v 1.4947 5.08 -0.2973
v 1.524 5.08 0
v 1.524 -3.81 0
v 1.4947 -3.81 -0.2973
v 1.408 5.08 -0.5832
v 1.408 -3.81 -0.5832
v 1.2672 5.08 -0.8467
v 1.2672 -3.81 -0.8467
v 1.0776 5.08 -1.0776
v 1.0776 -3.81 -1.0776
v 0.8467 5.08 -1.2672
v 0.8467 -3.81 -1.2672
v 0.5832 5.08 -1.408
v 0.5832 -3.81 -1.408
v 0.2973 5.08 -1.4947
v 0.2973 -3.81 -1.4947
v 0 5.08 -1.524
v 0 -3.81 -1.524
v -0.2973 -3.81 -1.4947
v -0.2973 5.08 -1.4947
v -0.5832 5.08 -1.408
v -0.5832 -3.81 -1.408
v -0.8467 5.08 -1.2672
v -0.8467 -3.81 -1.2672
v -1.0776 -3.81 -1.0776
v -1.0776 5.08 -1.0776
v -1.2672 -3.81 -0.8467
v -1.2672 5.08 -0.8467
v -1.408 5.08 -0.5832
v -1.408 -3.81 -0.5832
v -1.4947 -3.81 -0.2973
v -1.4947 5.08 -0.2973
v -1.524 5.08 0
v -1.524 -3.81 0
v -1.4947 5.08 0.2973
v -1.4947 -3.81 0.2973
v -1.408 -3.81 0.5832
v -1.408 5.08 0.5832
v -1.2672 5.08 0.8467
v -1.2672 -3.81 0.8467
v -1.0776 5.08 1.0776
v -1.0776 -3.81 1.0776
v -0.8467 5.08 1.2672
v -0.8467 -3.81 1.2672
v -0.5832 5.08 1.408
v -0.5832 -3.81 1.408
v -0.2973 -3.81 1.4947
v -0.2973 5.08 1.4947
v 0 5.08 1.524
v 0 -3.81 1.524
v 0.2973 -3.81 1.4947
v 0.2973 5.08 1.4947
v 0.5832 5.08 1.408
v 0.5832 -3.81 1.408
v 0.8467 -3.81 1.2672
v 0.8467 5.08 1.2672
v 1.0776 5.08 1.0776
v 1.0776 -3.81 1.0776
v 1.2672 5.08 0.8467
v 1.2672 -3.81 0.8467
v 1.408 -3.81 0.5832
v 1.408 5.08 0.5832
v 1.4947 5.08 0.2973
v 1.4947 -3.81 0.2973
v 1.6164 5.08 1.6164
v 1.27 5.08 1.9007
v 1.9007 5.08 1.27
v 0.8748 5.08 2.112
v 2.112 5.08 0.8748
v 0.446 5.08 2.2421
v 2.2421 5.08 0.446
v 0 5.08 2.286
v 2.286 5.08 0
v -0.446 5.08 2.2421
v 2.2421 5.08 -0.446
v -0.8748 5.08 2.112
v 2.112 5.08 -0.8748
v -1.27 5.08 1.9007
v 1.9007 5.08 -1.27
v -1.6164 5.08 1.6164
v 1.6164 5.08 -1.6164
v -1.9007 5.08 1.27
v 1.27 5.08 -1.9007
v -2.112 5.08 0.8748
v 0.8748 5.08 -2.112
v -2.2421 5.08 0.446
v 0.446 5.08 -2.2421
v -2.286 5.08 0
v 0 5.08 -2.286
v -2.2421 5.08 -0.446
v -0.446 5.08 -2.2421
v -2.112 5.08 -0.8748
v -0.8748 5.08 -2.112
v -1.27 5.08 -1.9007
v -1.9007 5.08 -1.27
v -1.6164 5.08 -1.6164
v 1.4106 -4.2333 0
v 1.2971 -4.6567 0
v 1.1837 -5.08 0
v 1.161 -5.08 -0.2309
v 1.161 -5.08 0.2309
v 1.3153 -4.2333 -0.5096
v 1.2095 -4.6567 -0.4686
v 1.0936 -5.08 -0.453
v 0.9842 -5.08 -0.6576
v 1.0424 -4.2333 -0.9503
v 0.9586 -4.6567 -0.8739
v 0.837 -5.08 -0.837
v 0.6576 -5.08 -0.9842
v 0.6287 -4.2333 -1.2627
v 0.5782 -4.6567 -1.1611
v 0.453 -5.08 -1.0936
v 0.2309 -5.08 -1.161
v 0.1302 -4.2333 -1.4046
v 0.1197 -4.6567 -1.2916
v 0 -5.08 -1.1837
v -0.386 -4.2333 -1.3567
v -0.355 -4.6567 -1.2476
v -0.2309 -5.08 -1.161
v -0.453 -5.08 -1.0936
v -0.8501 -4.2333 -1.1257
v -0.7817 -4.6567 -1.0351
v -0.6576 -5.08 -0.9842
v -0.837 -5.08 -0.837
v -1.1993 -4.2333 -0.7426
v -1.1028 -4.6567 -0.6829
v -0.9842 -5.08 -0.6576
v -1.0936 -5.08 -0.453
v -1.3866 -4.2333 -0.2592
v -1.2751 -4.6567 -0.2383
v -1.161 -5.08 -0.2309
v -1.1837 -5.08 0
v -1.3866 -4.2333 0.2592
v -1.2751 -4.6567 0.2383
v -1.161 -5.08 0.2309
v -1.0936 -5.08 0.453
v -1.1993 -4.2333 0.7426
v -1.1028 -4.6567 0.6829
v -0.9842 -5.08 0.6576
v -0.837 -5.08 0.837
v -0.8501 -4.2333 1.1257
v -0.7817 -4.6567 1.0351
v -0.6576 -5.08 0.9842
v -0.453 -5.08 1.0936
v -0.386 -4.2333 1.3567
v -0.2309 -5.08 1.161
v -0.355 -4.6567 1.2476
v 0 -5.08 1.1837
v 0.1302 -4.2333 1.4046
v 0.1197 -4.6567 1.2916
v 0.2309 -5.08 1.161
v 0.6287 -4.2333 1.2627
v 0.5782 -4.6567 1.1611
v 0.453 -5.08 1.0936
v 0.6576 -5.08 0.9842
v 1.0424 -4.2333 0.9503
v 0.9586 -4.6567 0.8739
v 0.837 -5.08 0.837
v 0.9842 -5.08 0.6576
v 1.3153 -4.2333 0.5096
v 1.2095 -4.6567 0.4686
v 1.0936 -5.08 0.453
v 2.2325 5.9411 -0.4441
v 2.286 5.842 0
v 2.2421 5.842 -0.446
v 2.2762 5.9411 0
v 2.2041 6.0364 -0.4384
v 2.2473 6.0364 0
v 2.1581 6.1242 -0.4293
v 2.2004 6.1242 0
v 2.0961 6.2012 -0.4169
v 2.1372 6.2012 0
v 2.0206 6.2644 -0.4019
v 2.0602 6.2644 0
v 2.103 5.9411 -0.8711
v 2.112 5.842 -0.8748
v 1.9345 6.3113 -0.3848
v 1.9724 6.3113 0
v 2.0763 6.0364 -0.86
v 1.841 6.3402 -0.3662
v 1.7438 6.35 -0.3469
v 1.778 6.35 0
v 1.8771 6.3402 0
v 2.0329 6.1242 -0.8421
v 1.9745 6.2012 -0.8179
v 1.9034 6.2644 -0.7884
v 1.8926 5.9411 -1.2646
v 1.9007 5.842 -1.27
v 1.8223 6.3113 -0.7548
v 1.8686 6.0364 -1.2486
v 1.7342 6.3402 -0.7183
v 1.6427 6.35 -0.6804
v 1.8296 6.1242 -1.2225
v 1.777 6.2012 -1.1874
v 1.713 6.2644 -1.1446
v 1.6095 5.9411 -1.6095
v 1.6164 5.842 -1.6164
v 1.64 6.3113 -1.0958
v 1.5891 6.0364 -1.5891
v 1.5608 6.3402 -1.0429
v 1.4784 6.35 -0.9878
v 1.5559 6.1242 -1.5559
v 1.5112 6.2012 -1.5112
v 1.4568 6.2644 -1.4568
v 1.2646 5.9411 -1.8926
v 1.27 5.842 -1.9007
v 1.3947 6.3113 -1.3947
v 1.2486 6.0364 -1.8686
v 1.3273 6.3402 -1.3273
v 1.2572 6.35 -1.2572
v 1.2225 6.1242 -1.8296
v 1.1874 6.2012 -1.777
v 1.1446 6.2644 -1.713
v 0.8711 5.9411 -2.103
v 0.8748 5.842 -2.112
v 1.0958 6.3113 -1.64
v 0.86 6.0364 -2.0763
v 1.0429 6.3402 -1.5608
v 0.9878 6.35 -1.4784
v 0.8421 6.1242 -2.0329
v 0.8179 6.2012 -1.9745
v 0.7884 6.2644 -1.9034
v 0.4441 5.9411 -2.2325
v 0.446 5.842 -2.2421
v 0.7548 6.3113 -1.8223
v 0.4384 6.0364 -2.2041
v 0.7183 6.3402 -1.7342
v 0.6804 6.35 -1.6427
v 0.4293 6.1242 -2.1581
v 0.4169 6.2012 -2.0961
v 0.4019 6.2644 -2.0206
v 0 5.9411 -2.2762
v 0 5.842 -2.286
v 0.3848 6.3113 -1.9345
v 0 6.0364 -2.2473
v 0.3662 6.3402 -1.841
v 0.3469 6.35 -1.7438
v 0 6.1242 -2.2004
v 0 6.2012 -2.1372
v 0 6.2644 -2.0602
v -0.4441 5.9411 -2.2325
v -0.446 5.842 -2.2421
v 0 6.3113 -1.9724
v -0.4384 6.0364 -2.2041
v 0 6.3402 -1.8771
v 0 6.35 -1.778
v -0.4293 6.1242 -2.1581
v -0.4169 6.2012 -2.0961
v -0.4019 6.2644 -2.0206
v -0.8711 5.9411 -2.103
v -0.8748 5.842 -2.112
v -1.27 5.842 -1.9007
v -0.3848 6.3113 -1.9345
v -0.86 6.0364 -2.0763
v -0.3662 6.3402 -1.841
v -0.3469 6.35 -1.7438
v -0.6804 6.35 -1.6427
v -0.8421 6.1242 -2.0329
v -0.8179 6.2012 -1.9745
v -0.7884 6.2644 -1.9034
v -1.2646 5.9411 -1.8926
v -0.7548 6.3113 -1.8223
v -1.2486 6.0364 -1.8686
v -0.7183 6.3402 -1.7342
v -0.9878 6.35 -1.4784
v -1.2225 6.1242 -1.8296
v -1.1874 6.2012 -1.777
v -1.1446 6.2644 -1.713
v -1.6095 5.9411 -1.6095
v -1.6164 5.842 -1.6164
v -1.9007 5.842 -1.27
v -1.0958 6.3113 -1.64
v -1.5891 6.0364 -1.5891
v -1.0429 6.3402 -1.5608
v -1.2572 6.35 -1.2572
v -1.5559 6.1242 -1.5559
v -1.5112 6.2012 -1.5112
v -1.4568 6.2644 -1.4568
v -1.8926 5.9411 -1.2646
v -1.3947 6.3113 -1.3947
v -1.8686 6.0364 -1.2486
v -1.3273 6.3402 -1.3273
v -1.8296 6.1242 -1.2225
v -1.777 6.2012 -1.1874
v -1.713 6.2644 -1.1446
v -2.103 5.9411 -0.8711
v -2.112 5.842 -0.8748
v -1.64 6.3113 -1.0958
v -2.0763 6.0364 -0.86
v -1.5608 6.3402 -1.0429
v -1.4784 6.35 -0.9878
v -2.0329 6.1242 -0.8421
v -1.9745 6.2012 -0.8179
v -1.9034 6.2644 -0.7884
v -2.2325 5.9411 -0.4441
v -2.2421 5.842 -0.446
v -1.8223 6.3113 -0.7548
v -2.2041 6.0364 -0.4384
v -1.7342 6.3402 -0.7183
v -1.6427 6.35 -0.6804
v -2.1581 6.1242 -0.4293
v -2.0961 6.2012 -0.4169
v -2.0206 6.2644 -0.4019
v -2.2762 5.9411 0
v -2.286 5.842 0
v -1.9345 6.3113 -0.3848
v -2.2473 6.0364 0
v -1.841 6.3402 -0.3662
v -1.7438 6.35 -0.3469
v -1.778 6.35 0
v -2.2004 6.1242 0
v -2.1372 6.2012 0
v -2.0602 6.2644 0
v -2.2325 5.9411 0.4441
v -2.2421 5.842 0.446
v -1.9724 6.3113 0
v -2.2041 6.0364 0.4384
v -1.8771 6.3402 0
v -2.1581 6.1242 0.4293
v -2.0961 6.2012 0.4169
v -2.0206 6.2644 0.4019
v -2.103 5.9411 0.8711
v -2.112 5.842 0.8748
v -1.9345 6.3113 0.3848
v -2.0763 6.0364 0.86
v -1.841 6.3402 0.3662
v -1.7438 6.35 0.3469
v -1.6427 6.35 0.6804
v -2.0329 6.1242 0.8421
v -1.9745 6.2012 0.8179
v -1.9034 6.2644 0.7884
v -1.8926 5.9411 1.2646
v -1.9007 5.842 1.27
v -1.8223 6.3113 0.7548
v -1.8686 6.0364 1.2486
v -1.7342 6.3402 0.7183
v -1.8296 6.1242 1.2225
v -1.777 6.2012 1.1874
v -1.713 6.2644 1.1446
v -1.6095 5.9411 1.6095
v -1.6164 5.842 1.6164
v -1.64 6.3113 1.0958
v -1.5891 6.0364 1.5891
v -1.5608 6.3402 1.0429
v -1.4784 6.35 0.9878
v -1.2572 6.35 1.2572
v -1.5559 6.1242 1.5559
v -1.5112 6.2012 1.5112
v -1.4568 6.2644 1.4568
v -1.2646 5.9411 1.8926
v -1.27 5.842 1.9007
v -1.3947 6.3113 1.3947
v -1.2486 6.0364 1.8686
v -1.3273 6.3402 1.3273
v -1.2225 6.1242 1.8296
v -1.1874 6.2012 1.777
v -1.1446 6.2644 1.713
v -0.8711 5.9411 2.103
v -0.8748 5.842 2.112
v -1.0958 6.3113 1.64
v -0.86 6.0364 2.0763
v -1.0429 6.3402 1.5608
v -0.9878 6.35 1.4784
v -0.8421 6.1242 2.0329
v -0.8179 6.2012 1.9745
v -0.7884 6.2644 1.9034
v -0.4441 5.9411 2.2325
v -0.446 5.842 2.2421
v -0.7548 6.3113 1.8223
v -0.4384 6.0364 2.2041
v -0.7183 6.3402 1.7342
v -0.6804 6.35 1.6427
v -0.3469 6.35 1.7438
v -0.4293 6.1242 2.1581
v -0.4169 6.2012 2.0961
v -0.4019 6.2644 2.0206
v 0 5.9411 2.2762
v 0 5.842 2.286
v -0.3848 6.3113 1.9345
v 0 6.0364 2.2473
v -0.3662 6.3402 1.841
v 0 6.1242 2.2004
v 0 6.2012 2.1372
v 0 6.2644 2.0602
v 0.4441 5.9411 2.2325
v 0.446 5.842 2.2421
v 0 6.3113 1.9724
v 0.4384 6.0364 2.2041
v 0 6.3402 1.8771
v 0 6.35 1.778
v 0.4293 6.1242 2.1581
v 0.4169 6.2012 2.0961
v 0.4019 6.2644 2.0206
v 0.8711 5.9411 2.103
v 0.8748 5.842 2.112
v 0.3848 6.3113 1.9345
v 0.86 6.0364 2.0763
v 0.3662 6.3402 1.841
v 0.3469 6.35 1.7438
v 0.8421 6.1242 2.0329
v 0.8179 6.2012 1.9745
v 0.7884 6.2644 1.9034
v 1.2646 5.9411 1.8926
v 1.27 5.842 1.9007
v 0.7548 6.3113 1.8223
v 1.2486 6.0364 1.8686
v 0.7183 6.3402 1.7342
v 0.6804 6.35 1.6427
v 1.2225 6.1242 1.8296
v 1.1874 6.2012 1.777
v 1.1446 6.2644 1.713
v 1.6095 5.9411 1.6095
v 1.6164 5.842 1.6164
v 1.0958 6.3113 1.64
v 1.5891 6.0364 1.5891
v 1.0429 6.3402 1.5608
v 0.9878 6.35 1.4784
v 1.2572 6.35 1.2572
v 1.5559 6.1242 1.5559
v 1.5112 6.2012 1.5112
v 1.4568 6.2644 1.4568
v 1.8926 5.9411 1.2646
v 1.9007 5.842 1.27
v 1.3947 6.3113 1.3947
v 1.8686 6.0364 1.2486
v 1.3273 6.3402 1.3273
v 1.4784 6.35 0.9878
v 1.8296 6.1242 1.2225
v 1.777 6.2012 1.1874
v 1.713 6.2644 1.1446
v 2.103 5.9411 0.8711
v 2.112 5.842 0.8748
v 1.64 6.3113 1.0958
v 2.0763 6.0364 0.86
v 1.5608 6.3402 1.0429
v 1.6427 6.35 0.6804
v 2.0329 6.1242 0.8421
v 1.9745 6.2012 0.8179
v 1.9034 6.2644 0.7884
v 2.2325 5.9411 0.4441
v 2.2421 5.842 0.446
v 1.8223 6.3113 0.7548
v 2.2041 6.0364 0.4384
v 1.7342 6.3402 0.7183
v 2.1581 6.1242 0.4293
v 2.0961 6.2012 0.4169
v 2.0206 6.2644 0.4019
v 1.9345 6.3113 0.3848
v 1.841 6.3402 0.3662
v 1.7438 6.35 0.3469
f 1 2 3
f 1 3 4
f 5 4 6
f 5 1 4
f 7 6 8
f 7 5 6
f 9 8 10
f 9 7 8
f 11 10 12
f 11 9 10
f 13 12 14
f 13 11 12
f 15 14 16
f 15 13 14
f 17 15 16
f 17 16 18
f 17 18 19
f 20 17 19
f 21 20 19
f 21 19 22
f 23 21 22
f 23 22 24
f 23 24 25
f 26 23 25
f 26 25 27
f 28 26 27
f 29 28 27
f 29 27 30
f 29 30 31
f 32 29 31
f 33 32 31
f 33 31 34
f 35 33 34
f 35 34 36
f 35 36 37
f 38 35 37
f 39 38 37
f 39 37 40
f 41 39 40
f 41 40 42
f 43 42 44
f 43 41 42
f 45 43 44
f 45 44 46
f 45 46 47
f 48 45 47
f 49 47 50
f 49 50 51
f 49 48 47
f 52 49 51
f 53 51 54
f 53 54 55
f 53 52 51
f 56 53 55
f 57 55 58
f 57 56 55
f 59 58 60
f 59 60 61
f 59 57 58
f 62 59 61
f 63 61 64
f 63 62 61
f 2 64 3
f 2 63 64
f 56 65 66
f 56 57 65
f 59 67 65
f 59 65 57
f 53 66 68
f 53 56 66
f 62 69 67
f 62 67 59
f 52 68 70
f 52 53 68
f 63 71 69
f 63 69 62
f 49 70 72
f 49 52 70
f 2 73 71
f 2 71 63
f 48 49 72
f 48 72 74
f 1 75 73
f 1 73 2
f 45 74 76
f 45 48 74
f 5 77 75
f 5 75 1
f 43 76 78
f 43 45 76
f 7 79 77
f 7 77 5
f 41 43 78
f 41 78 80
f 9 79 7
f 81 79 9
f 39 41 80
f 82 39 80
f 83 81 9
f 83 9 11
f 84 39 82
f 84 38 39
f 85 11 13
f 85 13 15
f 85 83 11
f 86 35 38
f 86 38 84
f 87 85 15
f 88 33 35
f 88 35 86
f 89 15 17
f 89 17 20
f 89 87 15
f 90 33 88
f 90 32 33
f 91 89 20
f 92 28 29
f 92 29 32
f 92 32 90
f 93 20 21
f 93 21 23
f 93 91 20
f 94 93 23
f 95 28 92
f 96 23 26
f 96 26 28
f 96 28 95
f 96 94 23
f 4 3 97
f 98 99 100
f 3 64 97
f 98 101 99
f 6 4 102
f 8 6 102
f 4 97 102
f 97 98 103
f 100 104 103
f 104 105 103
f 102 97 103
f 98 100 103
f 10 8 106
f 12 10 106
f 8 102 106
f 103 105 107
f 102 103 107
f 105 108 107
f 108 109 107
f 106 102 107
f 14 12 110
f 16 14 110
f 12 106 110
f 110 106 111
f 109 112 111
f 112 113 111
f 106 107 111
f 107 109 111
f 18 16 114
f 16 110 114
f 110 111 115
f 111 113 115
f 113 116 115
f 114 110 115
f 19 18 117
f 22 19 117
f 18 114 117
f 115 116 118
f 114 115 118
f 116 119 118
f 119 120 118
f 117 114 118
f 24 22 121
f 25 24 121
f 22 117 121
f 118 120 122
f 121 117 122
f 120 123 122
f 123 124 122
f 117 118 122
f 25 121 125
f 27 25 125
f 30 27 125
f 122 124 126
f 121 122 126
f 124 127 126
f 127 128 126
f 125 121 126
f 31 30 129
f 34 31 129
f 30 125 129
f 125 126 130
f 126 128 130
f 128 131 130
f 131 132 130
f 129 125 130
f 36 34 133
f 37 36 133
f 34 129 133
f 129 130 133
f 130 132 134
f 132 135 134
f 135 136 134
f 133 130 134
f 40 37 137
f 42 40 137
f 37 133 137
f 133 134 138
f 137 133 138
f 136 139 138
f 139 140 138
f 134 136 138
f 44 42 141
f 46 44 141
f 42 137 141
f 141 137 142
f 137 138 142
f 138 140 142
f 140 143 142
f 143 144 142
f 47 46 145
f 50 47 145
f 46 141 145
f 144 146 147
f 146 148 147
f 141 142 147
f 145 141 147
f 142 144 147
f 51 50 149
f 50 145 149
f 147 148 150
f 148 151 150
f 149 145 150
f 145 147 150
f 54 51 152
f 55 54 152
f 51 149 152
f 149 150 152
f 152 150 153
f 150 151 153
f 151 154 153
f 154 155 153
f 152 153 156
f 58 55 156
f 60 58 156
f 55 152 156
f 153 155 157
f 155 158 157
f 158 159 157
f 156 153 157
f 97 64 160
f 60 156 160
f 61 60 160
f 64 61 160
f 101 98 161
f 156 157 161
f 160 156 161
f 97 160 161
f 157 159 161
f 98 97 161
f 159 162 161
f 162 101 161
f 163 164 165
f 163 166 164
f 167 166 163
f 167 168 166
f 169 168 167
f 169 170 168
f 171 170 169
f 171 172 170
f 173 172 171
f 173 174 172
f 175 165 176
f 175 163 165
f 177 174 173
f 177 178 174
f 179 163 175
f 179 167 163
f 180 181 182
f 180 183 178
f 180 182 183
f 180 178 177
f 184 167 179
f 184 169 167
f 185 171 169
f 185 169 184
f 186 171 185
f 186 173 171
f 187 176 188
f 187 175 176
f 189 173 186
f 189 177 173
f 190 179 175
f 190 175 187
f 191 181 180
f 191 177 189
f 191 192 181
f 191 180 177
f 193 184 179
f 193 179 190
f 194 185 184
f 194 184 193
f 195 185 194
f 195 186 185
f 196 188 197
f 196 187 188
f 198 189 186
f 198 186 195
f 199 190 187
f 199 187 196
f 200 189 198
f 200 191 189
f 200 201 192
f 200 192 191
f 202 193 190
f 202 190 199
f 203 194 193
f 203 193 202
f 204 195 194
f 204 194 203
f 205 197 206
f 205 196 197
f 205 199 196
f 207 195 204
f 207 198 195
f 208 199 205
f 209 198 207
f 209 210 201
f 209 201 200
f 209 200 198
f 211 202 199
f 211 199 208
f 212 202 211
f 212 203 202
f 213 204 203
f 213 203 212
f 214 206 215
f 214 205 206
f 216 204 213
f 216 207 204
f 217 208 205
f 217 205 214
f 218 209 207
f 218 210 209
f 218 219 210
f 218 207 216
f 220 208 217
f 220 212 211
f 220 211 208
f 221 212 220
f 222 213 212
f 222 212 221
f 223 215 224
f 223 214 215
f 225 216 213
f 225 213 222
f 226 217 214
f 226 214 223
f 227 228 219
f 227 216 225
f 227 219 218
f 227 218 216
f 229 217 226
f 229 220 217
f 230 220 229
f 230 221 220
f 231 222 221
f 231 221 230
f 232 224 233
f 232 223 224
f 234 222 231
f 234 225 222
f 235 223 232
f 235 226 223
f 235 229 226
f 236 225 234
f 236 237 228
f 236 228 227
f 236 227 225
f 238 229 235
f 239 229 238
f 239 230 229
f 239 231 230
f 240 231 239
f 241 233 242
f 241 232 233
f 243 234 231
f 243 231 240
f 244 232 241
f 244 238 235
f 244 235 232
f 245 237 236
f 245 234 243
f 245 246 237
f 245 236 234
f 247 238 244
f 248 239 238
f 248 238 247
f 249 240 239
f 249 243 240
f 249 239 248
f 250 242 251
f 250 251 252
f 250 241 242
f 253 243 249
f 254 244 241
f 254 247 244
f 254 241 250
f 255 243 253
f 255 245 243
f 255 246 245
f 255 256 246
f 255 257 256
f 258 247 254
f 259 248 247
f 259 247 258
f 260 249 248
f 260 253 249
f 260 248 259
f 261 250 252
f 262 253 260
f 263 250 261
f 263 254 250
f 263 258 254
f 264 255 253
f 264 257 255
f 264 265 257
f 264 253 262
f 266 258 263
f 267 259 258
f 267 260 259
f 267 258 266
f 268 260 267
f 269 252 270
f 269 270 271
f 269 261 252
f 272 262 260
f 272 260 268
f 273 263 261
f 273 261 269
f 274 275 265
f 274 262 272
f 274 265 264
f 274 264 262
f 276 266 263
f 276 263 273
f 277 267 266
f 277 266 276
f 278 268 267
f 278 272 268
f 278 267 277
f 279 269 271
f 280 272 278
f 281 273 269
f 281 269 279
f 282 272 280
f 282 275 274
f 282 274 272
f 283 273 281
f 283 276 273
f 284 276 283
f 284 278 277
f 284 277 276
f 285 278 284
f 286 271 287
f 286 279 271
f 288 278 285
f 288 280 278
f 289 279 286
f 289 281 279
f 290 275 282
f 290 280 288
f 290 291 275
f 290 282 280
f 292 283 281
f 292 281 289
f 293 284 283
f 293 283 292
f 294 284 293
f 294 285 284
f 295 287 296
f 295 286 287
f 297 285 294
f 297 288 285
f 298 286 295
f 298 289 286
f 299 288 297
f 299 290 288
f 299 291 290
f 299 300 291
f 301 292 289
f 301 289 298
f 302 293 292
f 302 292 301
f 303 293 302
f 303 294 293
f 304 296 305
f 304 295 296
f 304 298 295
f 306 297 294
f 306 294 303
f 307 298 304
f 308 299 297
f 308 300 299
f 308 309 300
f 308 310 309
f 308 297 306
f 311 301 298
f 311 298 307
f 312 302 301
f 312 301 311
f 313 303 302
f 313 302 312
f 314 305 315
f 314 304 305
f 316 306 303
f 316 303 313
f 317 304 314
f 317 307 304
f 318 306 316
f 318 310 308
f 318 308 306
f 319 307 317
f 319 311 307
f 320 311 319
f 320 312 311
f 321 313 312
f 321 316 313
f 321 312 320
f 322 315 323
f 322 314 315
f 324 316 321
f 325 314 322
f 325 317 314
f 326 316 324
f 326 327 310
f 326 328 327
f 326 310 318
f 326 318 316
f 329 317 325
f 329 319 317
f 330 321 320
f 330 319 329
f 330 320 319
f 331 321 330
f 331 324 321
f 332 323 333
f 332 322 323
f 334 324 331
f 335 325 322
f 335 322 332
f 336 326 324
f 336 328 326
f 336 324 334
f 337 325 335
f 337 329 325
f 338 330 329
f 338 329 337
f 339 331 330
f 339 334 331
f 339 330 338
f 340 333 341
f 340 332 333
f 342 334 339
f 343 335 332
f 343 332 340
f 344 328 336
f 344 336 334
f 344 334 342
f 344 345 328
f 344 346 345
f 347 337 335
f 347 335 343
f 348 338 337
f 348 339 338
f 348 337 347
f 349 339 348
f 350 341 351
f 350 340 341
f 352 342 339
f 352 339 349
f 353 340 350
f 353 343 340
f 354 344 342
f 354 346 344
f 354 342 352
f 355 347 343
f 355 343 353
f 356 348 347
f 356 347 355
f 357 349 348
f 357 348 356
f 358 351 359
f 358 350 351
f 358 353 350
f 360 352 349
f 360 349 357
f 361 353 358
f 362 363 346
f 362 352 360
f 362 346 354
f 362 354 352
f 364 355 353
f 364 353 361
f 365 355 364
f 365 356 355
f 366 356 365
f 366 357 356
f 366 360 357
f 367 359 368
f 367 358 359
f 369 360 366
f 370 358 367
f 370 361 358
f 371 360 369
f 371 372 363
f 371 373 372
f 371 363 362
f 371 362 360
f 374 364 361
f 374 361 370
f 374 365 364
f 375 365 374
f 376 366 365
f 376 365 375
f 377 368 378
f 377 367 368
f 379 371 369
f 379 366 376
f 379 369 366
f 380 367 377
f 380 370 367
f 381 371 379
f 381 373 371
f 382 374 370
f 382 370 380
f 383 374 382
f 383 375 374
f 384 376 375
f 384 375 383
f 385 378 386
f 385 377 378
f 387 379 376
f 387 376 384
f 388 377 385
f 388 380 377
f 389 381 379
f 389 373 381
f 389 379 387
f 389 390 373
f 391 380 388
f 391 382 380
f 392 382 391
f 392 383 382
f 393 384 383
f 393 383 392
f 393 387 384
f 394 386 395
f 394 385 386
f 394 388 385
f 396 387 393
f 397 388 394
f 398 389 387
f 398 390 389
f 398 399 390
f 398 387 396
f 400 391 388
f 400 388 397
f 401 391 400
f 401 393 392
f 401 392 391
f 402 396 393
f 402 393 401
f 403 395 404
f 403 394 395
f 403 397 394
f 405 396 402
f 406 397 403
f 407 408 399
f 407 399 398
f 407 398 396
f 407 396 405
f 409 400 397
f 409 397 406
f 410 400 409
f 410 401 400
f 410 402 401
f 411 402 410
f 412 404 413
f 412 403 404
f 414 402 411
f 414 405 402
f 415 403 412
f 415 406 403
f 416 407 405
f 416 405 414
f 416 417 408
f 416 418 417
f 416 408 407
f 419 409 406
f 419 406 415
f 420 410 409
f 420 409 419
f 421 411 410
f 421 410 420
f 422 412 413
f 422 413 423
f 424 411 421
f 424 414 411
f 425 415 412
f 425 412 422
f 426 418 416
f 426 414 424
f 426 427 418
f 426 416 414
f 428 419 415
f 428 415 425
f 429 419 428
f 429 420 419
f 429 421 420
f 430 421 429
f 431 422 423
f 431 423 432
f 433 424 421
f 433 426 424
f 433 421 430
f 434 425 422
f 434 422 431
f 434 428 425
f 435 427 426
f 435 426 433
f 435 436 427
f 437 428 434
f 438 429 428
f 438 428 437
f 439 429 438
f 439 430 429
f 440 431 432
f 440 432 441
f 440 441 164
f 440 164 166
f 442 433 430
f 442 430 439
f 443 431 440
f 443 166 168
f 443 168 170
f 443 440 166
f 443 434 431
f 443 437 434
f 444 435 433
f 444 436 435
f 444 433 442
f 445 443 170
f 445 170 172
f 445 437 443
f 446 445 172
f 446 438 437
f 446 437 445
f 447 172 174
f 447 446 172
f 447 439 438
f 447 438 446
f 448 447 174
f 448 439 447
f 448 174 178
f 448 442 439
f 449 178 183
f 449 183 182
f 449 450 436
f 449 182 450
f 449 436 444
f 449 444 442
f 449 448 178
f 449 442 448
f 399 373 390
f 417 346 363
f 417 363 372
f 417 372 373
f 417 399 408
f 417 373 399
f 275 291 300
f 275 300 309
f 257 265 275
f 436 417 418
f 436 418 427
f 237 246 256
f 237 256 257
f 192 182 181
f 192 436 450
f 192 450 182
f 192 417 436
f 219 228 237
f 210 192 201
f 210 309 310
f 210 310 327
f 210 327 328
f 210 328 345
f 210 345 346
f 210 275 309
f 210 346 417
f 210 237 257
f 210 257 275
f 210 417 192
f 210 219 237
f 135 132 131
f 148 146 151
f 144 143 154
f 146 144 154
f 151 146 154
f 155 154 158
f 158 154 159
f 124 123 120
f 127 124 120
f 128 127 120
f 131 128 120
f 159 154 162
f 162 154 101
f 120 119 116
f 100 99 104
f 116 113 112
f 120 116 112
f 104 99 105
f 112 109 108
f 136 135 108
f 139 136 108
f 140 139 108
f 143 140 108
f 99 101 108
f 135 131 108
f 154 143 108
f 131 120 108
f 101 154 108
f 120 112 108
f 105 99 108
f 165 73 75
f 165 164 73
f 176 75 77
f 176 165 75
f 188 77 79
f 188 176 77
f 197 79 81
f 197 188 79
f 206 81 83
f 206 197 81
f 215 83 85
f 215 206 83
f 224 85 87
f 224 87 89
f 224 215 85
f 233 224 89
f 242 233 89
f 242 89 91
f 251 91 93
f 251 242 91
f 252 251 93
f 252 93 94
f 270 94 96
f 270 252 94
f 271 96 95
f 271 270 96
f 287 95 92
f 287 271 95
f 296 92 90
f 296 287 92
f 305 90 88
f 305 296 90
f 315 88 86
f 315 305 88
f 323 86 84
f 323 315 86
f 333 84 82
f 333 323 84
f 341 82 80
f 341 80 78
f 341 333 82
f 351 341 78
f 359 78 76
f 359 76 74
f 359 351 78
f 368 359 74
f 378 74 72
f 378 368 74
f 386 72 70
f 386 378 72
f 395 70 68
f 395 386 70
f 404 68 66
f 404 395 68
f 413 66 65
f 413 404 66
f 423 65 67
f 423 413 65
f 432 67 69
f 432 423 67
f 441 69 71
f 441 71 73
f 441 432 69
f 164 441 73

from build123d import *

# Parameters (mm, degrees)
SKETCH1_R           = 1.524
BOSS_EXTRUDE1_DEPTH = 5.08
CHAMFER1_SIZE       = 1.27
CHAMFER1_SIZE2      = 0.340295474


with BuildPart() as part:
    # Sketch1 → Boss-Extrude1 (new body, symmetric)
    with BuildSketch(Plane(origin=(0, 0, 0), x_dir=(1, 0, 0), z_dir=(0, 1, 0))):
        Circle(SKETCH1_R)
    extrude(amount=BOSS_EXTRUDE1_DEPTH, both=True)

    # Chamfer1
    chamfer1_edges = [part.edges().sort_by_distance(p)[0] for p in [
        (-1.524, -5.08, 0),
    ]]
    chamfer1_side = [part.faces().sort_by_distance(p)[0] for p in [
        (-1.524, 0, 0),
    ]]
    chamfer(chamfer1_edges, length=CHAMFER1_SIZE, length2=CHAMFER1_SIZE2, reference=chamfer1_side[0])

    # Sketch2 → Revolve1 (revolve)
    with BuildSketch(Plane.XY):
        with BuildLine():
            Line((0, 5.08), (2.286, 5.08))
            Line((2.286, 5.08), (2.286, 5.842))
            ThreePointArc((2.286, 5.842), (2.137210245, 6.201210245), (1.778, 6.35))
            Line((1.778, 6.35), (0, 6.35))
            Line((0, 6.35), (0, 5.08))
        make_face()
    revolve(axis=Axis((0, 5.08, 0), (0, 1, 0)))


solid = part.part
